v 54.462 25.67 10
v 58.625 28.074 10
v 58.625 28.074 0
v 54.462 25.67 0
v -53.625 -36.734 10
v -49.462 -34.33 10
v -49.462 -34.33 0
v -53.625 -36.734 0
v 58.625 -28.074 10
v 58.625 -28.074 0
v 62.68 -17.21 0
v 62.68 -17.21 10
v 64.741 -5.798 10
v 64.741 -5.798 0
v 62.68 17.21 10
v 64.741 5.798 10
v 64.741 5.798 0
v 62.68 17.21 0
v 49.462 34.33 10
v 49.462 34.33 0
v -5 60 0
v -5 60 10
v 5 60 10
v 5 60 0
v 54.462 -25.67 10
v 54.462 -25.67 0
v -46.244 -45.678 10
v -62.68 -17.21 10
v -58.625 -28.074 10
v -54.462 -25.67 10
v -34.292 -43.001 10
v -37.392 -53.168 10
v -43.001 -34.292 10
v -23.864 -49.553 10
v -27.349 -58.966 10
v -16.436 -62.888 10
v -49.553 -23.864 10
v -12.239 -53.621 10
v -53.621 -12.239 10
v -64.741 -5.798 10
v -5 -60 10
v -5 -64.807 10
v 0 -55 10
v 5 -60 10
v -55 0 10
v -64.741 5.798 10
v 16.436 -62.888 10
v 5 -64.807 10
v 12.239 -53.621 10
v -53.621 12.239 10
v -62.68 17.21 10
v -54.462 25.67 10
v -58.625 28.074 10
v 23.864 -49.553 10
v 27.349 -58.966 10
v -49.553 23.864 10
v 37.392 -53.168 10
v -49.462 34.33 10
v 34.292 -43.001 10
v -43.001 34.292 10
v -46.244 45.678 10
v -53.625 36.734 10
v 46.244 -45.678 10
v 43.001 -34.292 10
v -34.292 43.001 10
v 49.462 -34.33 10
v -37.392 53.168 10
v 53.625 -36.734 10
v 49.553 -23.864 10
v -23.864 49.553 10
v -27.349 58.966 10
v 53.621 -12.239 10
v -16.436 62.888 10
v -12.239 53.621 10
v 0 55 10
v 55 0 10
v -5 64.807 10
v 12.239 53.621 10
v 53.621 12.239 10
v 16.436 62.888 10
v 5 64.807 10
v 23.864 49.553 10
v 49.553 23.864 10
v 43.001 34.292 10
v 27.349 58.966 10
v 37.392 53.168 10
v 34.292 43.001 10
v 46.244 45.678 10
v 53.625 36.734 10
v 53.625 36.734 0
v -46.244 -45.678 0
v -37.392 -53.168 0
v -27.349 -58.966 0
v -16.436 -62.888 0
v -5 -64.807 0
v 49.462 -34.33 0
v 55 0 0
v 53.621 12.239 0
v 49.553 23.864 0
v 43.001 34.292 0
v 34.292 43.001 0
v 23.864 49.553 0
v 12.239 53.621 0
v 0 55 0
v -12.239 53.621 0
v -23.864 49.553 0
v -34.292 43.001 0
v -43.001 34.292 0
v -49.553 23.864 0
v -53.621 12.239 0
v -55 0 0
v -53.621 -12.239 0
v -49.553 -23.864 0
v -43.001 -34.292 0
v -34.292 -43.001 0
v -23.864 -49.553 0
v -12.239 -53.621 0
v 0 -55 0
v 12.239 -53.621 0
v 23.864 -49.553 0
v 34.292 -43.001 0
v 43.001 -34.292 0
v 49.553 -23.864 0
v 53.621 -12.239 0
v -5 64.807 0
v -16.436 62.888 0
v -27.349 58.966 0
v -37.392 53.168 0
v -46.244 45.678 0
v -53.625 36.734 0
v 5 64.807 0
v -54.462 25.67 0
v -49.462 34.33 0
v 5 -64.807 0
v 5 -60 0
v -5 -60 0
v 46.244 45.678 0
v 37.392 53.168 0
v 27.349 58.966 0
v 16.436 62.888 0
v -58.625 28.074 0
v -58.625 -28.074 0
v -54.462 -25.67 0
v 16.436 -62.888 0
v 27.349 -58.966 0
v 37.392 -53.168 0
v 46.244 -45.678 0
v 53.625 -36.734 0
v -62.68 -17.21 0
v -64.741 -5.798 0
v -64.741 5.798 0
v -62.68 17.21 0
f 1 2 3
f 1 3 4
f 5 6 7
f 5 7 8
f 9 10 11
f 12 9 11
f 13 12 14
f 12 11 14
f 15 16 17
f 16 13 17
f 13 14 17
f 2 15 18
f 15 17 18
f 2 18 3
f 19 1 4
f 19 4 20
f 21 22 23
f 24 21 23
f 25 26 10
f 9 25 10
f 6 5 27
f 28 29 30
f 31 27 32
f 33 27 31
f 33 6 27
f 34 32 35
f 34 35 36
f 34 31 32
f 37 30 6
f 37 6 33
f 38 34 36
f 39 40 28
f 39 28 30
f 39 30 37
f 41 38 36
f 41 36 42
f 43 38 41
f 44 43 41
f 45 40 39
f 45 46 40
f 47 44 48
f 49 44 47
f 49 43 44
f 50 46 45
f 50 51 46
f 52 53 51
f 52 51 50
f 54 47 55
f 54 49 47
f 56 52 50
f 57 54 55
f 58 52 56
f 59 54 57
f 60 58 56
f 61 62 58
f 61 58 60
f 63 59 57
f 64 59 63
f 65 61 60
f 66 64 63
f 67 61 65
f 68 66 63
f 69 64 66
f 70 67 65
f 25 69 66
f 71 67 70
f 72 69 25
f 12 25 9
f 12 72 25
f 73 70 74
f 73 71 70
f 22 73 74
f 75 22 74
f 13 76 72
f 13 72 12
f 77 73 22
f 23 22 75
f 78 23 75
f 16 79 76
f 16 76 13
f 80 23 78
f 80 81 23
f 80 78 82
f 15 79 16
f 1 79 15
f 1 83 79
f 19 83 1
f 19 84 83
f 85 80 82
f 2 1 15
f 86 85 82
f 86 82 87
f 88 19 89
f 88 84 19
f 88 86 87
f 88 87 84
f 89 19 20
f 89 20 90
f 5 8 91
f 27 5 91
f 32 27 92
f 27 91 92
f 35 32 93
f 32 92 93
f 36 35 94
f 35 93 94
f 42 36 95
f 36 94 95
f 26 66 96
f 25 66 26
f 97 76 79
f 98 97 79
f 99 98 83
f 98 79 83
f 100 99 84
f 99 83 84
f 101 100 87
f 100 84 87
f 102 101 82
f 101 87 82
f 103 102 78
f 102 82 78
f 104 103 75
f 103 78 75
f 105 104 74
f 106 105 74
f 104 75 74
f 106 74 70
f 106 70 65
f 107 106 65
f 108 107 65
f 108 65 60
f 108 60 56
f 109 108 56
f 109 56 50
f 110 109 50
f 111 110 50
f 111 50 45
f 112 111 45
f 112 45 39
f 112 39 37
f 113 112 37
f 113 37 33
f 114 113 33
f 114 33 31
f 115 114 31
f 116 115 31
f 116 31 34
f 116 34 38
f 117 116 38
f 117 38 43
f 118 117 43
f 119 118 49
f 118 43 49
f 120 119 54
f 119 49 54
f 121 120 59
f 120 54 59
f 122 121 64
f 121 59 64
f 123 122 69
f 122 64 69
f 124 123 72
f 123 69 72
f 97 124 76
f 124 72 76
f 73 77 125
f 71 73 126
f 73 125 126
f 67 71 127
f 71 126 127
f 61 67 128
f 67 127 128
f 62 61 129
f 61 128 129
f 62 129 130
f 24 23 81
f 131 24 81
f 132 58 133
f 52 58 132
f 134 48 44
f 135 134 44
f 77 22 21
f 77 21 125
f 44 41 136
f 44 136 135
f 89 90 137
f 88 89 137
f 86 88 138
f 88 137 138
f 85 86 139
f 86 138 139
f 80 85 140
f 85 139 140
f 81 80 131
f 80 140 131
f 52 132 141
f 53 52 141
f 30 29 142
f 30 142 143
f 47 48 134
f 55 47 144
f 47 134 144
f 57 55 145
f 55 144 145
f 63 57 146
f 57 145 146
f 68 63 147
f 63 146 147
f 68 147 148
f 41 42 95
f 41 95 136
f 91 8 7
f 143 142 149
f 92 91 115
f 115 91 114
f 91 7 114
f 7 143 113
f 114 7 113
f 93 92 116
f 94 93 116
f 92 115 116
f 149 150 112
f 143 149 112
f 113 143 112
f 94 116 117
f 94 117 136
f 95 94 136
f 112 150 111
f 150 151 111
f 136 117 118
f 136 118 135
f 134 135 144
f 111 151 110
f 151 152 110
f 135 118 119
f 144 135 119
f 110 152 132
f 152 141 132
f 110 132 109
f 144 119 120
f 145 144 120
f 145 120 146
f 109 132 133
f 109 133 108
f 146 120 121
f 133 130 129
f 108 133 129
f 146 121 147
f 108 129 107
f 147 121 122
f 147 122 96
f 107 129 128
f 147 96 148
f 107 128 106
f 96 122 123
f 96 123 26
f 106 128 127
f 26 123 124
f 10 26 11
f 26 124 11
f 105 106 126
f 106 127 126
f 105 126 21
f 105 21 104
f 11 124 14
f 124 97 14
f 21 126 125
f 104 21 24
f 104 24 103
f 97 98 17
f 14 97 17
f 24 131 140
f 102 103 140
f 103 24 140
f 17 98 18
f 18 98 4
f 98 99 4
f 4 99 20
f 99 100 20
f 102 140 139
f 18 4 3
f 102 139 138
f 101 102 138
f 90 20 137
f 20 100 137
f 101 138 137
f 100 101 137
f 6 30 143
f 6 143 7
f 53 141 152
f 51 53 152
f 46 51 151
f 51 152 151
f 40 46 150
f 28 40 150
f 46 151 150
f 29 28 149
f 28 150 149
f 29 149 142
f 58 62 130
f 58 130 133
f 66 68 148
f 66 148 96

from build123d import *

# Parameters (mm, degrees)
SKETCH1_R           = 65
BOSS_EXTRUDE1_DEPTH = 10
SKETCH2_R           = 55
CUT_EXTRUDE1_DEPTH  = 11
SKETCH3_W           = 10
SKETCH3_H           = 5
CUT_EXTRUDE4_DEPTH  = 11


with BuildPart() as part:
    # Sketch1 → Boss-Extrude1 (new body)
    with BuildSketch(Plane.XY):
        Circle(SKETCH1_R)
    extrude(amount=BOSS_EXTRUDE1_DEPTH)

    # Sketch2 → Cut-Extrude1 (cut, through all)
    with BuildSketch(Plane.XY.offset(10)):
        Circle(SKETCH2_R)
    extrude(amount=-CUT_EXTRUDE1_DEPTH, mode=Mode.SUBTRACT)

    # Sketch3 → Cut-Extrude4 (cut, through all)
    with BuildSketch(Plane.XY.offset(10)):
        Polygon((49.461524227, 34.330127019), (53.791651246, 36.830127019), (58.791651246, 28.169872981), (54.461524227, 25.669872981), align=None)
        with Locations((0, 62.5)):
            Rectangle(SKETCH3_W, SKETCH3_H)
        Polygon((54.461524227, -25.669872981), (58.791651246, -28.169872981), (53.791651246, -36.830127019), (49.461524227, -34.330127019), align=None)
        with Locations((0, -62.5)):
            Rectangle(SKETCH3_W, SKETCH3_H)
        Polygon((-49.461524227, -34.330127019), (-53.791651246, -36.830127019), (-58.791651246, -28.169872981), (-54.461524227, -25.669872981), align=None)
        Polygon((-54.461524227, 25.669872981), (-58.791651246, 28.169872981), (-53.791651246, 36.830127019), (-49.461524227, 34.330127019), align=None)
    extrude(amount=-CUT_EXTRUDE4_DEPTH, mode=Mode.SUBTRACT)


solid = part.part
